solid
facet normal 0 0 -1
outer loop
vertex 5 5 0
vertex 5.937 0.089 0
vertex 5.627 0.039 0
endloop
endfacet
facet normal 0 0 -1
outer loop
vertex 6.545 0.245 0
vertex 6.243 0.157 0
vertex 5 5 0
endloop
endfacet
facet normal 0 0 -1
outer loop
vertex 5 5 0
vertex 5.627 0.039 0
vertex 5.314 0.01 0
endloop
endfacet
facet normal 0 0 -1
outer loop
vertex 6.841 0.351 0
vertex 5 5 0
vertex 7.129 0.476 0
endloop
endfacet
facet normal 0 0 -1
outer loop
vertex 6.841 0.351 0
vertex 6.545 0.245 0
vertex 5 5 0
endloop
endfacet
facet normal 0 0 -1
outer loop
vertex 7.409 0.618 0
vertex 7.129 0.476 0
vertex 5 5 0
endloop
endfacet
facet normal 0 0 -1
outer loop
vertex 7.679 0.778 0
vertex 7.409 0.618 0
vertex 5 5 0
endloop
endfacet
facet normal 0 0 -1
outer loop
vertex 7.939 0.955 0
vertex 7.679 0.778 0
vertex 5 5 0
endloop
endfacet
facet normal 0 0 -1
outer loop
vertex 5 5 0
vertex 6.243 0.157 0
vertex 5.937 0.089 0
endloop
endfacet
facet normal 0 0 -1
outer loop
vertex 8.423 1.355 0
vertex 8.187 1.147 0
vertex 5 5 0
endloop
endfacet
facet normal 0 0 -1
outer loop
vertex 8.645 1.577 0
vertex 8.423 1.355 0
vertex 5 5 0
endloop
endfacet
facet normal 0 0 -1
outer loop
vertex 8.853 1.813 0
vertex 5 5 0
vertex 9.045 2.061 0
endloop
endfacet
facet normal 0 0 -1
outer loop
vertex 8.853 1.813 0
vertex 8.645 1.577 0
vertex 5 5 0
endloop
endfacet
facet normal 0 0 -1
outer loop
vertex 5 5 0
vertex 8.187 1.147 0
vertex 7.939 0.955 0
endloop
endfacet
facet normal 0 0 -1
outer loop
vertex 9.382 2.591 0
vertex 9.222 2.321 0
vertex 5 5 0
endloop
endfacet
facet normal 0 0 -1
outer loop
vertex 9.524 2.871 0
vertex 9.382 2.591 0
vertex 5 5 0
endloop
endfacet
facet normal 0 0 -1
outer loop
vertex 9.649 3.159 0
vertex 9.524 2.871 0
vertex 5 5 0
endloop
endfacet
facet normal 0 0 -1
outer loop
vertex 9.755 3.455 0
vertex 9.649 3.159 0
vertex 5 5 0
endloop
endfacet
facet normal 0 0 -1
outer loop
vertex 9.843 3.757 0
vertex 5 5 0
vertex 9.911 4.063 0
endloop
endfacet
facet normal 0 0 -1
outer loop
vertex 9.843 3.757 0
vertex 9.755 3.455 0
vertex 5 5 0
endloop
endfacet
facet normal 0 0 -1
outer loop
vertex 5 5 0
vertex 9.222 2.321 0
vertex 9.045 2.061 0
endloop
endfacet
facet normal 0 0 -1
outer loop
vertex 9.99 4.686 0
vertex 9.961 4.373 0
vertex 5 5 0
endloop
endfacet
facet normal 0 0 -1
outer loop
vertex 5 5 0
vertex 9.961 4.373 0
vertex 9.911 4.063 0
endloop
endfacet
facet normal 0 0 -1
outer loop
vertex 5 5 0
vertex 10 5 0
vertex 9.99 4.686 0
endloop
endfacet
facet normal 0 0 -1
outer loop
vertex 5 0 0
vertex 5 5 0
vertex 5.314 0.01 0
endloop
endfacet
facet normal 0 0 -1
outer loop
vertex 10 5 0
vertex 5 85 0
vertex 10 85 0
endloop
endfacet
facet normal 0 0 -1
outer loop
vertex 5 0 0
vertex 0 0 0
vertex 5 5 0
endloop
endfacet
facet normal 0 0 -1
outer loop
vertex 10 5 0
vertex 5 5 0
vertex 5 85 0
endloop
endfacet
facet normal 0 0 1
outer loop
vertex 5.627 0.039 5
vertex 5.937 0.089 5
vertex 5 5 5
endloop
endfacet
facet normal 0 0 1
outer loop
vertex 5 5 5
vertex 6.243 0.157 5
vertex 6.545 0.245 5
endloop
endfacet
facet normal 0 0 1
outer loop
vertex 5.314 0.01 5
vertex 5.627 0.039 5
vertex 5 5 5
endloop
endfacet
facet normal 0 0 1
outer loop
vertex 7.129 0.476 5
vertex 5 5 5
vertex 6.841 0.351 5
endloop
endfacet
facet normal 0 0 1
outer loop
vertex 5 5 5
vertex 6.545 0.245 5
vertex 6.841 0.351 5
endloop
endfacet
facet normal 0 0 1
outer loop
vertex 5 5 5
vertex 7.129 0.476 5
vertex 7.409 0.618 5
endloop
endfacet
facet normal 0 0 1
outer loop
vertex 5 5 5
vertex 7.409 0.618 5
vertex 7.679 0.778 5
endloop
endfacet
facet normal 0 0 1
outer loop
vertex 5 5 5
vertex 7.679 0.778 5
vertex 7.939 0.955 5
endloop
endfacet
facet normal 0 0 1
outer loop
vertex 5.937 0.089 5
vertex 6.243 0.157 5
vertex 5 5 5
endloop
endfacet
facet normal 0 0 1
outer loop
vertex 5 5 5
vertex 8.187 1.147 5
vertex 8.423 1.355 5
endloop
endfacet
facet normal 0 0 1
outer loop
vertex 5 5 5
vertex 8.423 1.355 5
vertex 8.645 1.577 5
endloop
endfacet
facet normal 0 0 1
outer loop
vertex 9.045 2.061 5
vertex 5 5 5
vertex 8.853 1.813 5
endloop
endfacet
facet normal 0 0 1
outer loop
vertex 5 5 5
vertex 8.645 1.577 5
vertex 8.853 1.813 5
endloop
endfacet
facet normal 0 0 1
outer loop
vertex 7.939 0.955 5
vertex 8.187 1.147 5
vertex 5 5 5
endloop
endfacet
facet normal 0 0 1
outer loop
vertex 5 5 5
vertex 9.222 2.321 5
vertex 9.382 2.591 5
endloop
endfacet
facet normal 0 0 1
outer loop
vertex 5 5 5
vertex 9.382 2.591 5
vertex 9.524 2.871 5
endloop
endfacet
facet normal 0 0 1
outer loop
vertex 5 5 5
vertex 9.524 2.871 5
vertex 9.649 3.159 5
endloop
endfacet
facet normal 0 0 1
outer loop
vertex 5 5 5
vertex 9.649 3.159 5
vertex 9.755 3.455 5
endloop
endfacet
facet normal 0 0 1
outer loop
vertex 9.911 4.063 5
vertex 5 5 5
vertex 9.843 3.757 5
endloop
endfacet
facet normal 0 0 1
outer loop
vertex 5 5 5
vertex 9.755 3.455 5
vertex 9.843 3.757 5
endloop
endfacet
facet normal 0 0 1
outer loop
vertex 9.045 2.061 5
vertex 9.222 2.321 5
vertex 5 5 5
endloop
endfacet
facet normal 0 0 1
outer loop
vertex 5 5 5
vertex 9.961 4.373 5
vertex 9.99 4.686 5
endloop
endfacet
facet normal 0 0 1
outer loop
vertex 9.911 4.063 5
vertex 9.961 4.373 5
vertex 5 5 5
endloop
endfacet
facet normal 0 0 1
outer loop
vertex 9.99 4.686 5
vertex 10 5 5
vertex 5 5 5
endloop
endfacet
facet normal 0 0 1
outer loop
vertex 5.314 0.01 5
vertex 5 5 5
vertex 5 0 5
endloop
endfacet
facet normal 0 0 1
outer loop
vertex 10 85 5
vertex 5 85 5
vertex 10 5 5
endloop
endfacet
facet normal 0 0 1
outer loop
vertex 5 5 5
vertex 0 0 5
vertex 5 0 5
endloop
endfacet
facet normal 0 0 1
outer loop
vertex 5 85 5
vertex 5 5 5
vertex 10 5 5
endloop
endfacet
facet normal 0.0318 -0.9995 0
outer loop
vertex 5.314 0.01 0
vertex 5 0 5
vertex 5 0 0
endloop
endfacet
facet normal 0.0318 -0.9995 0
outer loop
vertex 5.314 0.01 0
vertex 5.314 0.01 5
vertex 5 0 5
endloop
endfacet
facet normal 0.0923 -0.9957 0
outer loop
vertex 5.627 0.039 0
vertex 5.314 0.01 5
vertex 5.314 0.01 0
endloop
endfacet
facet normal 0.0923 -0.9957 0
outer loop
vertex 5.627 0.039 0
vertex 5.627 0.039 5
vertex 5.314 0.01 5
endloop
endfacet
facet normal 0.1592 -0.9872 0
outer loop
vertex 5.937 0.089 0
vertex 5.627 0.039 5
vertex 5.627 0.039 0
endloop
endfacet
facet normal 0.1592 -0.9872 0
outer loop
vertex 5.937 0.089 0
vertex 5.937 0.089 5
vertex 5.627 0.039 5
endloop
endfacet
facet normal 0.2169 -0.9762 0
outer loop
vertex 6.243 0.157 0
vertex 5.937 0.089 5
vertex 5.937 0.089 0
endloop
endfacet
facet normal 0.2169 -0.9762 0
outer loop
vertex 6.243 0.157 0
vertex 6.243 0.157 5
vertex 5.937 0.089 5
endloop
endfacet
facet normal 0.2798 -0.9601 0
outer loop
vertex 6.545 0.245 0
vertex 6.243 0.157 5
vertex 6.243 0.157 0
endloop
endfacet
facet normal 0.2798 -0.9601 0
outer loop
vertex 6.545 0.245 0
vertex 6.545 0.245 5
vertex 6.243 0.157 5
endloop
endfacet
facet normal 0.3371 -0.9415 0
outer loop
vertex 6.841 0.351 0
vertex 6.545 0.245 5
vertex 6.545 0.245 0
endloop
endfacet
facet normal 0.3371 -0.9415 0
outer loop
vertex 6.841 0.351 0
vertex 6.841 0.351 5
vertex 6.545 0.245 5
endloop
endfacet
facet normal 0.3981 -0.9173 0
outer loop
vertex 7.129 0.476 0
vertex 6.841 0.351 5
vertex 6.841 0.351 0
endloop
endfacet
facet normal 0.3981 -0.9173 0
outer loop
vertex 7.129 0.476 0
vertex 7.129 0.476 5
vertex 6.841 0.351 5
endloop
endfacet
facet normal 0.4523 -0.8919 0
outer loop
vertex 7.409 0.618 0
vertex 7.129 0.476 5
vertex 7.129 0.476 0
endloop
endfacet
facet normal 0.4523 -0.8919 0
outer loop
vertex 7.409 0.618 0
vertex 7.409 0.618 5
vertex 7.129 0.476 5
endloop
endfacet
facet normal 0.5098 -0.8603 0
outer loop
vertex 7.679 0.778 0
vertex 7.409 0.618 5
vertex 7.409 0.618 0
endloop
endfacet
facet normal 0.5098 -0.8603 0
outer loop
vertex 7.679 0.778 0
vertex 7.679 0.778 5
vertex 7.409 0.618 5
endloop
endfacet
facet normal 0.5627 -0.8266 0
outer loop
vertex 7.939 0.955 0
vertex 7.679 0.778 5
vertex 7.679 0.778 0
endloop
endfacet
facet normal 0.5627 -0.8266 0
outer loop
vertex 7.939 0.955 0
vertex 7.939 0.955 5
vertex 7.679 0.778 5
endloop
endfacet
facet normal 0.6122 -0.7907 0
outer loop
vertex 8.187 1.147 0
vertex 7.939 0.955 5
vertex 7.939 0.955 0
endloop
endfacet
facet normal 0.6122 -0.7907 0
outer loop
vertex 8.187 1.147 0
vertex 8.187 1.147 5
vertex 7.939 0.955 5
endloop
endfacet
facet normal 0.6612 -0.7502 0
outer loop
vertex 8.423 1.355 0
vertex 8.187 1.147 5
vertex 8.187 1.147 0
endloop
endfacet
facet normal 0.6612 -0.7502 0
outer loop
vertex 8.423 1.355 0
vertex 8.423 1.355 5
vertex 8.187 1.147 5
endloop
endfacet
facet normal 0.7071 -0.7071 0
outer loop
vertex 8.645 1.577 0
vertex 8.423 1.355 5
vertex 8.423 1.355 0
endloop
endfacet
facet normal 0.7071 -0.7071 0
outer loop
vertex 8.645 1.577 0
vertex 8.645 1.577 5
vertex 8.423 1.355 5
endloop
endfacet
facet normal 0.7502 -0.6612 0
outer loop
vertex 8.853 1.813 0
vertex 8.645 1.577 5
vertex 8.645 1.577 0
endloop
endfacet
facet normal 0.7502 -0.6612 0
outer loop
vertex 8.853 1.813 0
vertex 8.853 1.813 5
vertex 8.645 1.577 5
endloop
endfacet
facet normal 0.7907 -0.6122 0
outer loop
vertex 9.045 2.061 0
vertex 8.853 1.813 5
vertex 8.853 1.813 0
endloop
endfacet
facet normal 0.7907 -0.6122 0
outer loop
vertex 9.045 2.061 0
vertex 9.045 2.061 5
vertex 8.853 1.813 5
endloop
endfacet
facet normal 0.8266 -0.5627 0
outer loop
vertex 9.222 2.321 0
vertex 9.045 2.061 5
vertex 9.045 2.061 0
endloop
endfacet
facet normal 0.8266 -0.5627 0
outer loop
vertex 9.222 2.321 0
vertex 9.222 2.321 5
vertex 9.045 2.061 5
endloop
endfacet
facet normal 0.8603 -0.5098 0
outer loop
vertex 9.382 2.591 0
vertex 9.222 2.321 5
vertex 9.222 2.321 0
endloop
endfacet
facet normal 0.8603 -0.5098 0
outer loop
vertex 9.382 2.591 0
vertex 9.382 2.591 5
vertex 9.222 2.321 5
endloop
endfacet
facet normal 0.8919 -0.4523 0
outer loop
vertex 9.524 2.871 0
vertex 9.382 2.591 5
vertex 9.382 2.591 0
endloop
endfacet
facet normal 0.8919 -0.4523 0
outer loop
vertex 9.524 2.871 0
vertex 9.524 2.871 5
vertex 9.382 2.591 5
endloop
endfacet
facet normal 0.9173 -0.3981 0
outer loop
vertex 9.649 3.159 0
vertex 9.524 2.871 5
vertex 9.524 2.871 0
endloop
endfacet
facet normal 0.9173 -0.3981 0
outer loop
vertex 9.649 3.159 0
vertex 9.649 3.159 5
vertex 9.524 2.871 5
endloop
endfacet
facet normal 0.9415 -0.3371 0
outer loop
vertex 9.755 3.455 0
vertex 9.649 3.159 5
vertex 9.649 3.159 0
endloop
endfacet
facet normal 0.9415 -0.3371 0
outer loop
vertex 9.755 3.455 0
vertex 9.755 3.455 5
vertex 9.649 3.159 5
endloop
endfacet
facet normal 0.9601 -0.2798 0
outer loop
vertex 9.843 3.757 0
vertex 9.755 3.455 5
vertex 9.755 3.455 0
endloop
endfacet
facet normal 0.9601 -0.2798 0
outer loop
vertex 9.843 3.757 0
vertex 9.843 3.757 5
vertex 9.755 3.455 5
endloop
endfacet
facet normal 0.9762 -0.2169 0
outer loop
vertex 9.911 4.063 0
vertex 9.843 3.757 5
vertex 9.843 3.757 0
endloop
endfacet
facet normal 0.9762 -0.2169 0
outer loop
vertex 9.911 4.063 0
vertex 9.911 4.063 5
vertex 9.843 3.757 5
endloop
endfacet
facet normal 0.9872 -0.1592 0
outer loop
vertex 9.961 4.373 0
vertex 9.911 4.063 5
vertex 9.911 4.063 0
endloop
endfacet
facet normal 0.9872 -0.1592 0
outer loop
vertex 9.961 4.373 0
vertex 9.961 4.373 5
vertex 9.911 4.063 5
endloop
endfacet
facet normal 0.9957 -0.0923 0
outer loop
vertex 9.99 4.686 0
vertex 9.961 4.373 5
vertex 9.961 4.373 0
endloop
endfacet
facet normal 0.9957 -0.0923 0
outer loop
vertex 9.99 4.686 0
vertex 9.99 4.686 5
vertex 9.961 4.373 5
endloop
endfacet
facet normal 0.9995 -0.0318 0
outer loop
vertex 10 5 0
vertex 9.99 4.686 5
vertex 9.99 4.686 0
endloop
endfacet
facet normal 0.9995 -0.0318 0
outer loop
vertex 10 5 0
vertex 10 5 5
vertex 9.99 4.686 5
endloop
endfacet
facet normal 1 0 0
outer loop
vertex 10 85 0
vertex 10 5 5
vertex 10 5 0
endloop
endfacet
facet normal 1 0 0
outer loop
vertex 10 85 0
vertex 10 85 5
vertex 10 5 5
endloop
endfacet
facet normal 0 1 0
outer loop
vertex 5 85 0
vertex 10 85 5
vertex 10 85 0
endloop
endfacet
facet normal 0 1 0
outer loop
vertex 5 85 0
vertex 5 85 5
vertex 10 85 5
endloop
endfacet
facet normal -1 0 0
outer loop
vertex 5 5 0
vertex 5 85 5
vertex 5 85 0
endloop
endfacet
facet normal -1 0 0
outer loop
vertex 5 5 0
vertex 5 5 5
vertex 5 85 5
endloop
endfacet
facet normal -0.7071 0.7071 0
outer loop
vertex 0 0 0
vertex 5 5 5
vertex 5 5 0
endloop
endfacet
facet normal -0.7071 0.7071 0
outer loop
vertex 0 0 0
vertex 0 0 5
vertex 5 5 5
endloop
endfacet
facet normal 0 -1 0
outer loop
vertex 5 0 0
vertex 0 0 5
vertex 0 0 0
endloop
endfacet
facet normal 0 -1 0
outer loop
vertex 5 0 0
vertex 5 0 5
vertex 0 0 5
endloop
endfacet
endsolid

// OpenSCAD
// CrowBar - Pacidlo na odlepovanie objektov z platu
// 20260421, Ondrej DURAS (dury) NOKIA

/* [Preview] */
preview="plate";
$fn=100;

/* [Dimensions] */
cbArm=80.0;  // dlzka paky pacidla
cbTip=5.0;   // dlzka hrotu pacidla
cbRad=5.0;   // polomer zaoblenia pacidla
cbExt=5.0;   // sirka pacidla


/* [Colors] */
colorCrowBar="#105030"; // farba pacidla ... je nepodstatna

module crowBar(Arm=cbArm,Tip=cbTip,Rad=cbRad,Ext=cbExt) {
    linear_extrude(Ext) {
    union() {
        translate([0,0,0])      // Tip - polygon hrotu
            polygon([[0,0],[Tip,0],[Tip,Rad]],[[0,1,2]]);
        translate([Tip,Rad])    // Arm - rameno pacidla
            square([Rad,Arm]);
        difference() {          // zaoblena cast stvrtkruh/stcrtvalec
            translate([Tip,Rad])
                circle(r=Rad);  // zakladny kruh, z ktoreho rezeme stvorec a obdlznik
            translate([0,0])
                square([Tip,2*Rad]); // urezanie 2. a 3. kvadrantu kruhu
            translate([Tip,Rad])
                square([Rad,Rad]);   // urezanie 1. kvadrandu. Ostava iba 4.-ty kvadrant.
        } //diff
    } // union
    } //Ext
}

/* [PreviewIF] */
if(preview=="plate") {
    color(colorCrowBar)
    crowBar();
}
